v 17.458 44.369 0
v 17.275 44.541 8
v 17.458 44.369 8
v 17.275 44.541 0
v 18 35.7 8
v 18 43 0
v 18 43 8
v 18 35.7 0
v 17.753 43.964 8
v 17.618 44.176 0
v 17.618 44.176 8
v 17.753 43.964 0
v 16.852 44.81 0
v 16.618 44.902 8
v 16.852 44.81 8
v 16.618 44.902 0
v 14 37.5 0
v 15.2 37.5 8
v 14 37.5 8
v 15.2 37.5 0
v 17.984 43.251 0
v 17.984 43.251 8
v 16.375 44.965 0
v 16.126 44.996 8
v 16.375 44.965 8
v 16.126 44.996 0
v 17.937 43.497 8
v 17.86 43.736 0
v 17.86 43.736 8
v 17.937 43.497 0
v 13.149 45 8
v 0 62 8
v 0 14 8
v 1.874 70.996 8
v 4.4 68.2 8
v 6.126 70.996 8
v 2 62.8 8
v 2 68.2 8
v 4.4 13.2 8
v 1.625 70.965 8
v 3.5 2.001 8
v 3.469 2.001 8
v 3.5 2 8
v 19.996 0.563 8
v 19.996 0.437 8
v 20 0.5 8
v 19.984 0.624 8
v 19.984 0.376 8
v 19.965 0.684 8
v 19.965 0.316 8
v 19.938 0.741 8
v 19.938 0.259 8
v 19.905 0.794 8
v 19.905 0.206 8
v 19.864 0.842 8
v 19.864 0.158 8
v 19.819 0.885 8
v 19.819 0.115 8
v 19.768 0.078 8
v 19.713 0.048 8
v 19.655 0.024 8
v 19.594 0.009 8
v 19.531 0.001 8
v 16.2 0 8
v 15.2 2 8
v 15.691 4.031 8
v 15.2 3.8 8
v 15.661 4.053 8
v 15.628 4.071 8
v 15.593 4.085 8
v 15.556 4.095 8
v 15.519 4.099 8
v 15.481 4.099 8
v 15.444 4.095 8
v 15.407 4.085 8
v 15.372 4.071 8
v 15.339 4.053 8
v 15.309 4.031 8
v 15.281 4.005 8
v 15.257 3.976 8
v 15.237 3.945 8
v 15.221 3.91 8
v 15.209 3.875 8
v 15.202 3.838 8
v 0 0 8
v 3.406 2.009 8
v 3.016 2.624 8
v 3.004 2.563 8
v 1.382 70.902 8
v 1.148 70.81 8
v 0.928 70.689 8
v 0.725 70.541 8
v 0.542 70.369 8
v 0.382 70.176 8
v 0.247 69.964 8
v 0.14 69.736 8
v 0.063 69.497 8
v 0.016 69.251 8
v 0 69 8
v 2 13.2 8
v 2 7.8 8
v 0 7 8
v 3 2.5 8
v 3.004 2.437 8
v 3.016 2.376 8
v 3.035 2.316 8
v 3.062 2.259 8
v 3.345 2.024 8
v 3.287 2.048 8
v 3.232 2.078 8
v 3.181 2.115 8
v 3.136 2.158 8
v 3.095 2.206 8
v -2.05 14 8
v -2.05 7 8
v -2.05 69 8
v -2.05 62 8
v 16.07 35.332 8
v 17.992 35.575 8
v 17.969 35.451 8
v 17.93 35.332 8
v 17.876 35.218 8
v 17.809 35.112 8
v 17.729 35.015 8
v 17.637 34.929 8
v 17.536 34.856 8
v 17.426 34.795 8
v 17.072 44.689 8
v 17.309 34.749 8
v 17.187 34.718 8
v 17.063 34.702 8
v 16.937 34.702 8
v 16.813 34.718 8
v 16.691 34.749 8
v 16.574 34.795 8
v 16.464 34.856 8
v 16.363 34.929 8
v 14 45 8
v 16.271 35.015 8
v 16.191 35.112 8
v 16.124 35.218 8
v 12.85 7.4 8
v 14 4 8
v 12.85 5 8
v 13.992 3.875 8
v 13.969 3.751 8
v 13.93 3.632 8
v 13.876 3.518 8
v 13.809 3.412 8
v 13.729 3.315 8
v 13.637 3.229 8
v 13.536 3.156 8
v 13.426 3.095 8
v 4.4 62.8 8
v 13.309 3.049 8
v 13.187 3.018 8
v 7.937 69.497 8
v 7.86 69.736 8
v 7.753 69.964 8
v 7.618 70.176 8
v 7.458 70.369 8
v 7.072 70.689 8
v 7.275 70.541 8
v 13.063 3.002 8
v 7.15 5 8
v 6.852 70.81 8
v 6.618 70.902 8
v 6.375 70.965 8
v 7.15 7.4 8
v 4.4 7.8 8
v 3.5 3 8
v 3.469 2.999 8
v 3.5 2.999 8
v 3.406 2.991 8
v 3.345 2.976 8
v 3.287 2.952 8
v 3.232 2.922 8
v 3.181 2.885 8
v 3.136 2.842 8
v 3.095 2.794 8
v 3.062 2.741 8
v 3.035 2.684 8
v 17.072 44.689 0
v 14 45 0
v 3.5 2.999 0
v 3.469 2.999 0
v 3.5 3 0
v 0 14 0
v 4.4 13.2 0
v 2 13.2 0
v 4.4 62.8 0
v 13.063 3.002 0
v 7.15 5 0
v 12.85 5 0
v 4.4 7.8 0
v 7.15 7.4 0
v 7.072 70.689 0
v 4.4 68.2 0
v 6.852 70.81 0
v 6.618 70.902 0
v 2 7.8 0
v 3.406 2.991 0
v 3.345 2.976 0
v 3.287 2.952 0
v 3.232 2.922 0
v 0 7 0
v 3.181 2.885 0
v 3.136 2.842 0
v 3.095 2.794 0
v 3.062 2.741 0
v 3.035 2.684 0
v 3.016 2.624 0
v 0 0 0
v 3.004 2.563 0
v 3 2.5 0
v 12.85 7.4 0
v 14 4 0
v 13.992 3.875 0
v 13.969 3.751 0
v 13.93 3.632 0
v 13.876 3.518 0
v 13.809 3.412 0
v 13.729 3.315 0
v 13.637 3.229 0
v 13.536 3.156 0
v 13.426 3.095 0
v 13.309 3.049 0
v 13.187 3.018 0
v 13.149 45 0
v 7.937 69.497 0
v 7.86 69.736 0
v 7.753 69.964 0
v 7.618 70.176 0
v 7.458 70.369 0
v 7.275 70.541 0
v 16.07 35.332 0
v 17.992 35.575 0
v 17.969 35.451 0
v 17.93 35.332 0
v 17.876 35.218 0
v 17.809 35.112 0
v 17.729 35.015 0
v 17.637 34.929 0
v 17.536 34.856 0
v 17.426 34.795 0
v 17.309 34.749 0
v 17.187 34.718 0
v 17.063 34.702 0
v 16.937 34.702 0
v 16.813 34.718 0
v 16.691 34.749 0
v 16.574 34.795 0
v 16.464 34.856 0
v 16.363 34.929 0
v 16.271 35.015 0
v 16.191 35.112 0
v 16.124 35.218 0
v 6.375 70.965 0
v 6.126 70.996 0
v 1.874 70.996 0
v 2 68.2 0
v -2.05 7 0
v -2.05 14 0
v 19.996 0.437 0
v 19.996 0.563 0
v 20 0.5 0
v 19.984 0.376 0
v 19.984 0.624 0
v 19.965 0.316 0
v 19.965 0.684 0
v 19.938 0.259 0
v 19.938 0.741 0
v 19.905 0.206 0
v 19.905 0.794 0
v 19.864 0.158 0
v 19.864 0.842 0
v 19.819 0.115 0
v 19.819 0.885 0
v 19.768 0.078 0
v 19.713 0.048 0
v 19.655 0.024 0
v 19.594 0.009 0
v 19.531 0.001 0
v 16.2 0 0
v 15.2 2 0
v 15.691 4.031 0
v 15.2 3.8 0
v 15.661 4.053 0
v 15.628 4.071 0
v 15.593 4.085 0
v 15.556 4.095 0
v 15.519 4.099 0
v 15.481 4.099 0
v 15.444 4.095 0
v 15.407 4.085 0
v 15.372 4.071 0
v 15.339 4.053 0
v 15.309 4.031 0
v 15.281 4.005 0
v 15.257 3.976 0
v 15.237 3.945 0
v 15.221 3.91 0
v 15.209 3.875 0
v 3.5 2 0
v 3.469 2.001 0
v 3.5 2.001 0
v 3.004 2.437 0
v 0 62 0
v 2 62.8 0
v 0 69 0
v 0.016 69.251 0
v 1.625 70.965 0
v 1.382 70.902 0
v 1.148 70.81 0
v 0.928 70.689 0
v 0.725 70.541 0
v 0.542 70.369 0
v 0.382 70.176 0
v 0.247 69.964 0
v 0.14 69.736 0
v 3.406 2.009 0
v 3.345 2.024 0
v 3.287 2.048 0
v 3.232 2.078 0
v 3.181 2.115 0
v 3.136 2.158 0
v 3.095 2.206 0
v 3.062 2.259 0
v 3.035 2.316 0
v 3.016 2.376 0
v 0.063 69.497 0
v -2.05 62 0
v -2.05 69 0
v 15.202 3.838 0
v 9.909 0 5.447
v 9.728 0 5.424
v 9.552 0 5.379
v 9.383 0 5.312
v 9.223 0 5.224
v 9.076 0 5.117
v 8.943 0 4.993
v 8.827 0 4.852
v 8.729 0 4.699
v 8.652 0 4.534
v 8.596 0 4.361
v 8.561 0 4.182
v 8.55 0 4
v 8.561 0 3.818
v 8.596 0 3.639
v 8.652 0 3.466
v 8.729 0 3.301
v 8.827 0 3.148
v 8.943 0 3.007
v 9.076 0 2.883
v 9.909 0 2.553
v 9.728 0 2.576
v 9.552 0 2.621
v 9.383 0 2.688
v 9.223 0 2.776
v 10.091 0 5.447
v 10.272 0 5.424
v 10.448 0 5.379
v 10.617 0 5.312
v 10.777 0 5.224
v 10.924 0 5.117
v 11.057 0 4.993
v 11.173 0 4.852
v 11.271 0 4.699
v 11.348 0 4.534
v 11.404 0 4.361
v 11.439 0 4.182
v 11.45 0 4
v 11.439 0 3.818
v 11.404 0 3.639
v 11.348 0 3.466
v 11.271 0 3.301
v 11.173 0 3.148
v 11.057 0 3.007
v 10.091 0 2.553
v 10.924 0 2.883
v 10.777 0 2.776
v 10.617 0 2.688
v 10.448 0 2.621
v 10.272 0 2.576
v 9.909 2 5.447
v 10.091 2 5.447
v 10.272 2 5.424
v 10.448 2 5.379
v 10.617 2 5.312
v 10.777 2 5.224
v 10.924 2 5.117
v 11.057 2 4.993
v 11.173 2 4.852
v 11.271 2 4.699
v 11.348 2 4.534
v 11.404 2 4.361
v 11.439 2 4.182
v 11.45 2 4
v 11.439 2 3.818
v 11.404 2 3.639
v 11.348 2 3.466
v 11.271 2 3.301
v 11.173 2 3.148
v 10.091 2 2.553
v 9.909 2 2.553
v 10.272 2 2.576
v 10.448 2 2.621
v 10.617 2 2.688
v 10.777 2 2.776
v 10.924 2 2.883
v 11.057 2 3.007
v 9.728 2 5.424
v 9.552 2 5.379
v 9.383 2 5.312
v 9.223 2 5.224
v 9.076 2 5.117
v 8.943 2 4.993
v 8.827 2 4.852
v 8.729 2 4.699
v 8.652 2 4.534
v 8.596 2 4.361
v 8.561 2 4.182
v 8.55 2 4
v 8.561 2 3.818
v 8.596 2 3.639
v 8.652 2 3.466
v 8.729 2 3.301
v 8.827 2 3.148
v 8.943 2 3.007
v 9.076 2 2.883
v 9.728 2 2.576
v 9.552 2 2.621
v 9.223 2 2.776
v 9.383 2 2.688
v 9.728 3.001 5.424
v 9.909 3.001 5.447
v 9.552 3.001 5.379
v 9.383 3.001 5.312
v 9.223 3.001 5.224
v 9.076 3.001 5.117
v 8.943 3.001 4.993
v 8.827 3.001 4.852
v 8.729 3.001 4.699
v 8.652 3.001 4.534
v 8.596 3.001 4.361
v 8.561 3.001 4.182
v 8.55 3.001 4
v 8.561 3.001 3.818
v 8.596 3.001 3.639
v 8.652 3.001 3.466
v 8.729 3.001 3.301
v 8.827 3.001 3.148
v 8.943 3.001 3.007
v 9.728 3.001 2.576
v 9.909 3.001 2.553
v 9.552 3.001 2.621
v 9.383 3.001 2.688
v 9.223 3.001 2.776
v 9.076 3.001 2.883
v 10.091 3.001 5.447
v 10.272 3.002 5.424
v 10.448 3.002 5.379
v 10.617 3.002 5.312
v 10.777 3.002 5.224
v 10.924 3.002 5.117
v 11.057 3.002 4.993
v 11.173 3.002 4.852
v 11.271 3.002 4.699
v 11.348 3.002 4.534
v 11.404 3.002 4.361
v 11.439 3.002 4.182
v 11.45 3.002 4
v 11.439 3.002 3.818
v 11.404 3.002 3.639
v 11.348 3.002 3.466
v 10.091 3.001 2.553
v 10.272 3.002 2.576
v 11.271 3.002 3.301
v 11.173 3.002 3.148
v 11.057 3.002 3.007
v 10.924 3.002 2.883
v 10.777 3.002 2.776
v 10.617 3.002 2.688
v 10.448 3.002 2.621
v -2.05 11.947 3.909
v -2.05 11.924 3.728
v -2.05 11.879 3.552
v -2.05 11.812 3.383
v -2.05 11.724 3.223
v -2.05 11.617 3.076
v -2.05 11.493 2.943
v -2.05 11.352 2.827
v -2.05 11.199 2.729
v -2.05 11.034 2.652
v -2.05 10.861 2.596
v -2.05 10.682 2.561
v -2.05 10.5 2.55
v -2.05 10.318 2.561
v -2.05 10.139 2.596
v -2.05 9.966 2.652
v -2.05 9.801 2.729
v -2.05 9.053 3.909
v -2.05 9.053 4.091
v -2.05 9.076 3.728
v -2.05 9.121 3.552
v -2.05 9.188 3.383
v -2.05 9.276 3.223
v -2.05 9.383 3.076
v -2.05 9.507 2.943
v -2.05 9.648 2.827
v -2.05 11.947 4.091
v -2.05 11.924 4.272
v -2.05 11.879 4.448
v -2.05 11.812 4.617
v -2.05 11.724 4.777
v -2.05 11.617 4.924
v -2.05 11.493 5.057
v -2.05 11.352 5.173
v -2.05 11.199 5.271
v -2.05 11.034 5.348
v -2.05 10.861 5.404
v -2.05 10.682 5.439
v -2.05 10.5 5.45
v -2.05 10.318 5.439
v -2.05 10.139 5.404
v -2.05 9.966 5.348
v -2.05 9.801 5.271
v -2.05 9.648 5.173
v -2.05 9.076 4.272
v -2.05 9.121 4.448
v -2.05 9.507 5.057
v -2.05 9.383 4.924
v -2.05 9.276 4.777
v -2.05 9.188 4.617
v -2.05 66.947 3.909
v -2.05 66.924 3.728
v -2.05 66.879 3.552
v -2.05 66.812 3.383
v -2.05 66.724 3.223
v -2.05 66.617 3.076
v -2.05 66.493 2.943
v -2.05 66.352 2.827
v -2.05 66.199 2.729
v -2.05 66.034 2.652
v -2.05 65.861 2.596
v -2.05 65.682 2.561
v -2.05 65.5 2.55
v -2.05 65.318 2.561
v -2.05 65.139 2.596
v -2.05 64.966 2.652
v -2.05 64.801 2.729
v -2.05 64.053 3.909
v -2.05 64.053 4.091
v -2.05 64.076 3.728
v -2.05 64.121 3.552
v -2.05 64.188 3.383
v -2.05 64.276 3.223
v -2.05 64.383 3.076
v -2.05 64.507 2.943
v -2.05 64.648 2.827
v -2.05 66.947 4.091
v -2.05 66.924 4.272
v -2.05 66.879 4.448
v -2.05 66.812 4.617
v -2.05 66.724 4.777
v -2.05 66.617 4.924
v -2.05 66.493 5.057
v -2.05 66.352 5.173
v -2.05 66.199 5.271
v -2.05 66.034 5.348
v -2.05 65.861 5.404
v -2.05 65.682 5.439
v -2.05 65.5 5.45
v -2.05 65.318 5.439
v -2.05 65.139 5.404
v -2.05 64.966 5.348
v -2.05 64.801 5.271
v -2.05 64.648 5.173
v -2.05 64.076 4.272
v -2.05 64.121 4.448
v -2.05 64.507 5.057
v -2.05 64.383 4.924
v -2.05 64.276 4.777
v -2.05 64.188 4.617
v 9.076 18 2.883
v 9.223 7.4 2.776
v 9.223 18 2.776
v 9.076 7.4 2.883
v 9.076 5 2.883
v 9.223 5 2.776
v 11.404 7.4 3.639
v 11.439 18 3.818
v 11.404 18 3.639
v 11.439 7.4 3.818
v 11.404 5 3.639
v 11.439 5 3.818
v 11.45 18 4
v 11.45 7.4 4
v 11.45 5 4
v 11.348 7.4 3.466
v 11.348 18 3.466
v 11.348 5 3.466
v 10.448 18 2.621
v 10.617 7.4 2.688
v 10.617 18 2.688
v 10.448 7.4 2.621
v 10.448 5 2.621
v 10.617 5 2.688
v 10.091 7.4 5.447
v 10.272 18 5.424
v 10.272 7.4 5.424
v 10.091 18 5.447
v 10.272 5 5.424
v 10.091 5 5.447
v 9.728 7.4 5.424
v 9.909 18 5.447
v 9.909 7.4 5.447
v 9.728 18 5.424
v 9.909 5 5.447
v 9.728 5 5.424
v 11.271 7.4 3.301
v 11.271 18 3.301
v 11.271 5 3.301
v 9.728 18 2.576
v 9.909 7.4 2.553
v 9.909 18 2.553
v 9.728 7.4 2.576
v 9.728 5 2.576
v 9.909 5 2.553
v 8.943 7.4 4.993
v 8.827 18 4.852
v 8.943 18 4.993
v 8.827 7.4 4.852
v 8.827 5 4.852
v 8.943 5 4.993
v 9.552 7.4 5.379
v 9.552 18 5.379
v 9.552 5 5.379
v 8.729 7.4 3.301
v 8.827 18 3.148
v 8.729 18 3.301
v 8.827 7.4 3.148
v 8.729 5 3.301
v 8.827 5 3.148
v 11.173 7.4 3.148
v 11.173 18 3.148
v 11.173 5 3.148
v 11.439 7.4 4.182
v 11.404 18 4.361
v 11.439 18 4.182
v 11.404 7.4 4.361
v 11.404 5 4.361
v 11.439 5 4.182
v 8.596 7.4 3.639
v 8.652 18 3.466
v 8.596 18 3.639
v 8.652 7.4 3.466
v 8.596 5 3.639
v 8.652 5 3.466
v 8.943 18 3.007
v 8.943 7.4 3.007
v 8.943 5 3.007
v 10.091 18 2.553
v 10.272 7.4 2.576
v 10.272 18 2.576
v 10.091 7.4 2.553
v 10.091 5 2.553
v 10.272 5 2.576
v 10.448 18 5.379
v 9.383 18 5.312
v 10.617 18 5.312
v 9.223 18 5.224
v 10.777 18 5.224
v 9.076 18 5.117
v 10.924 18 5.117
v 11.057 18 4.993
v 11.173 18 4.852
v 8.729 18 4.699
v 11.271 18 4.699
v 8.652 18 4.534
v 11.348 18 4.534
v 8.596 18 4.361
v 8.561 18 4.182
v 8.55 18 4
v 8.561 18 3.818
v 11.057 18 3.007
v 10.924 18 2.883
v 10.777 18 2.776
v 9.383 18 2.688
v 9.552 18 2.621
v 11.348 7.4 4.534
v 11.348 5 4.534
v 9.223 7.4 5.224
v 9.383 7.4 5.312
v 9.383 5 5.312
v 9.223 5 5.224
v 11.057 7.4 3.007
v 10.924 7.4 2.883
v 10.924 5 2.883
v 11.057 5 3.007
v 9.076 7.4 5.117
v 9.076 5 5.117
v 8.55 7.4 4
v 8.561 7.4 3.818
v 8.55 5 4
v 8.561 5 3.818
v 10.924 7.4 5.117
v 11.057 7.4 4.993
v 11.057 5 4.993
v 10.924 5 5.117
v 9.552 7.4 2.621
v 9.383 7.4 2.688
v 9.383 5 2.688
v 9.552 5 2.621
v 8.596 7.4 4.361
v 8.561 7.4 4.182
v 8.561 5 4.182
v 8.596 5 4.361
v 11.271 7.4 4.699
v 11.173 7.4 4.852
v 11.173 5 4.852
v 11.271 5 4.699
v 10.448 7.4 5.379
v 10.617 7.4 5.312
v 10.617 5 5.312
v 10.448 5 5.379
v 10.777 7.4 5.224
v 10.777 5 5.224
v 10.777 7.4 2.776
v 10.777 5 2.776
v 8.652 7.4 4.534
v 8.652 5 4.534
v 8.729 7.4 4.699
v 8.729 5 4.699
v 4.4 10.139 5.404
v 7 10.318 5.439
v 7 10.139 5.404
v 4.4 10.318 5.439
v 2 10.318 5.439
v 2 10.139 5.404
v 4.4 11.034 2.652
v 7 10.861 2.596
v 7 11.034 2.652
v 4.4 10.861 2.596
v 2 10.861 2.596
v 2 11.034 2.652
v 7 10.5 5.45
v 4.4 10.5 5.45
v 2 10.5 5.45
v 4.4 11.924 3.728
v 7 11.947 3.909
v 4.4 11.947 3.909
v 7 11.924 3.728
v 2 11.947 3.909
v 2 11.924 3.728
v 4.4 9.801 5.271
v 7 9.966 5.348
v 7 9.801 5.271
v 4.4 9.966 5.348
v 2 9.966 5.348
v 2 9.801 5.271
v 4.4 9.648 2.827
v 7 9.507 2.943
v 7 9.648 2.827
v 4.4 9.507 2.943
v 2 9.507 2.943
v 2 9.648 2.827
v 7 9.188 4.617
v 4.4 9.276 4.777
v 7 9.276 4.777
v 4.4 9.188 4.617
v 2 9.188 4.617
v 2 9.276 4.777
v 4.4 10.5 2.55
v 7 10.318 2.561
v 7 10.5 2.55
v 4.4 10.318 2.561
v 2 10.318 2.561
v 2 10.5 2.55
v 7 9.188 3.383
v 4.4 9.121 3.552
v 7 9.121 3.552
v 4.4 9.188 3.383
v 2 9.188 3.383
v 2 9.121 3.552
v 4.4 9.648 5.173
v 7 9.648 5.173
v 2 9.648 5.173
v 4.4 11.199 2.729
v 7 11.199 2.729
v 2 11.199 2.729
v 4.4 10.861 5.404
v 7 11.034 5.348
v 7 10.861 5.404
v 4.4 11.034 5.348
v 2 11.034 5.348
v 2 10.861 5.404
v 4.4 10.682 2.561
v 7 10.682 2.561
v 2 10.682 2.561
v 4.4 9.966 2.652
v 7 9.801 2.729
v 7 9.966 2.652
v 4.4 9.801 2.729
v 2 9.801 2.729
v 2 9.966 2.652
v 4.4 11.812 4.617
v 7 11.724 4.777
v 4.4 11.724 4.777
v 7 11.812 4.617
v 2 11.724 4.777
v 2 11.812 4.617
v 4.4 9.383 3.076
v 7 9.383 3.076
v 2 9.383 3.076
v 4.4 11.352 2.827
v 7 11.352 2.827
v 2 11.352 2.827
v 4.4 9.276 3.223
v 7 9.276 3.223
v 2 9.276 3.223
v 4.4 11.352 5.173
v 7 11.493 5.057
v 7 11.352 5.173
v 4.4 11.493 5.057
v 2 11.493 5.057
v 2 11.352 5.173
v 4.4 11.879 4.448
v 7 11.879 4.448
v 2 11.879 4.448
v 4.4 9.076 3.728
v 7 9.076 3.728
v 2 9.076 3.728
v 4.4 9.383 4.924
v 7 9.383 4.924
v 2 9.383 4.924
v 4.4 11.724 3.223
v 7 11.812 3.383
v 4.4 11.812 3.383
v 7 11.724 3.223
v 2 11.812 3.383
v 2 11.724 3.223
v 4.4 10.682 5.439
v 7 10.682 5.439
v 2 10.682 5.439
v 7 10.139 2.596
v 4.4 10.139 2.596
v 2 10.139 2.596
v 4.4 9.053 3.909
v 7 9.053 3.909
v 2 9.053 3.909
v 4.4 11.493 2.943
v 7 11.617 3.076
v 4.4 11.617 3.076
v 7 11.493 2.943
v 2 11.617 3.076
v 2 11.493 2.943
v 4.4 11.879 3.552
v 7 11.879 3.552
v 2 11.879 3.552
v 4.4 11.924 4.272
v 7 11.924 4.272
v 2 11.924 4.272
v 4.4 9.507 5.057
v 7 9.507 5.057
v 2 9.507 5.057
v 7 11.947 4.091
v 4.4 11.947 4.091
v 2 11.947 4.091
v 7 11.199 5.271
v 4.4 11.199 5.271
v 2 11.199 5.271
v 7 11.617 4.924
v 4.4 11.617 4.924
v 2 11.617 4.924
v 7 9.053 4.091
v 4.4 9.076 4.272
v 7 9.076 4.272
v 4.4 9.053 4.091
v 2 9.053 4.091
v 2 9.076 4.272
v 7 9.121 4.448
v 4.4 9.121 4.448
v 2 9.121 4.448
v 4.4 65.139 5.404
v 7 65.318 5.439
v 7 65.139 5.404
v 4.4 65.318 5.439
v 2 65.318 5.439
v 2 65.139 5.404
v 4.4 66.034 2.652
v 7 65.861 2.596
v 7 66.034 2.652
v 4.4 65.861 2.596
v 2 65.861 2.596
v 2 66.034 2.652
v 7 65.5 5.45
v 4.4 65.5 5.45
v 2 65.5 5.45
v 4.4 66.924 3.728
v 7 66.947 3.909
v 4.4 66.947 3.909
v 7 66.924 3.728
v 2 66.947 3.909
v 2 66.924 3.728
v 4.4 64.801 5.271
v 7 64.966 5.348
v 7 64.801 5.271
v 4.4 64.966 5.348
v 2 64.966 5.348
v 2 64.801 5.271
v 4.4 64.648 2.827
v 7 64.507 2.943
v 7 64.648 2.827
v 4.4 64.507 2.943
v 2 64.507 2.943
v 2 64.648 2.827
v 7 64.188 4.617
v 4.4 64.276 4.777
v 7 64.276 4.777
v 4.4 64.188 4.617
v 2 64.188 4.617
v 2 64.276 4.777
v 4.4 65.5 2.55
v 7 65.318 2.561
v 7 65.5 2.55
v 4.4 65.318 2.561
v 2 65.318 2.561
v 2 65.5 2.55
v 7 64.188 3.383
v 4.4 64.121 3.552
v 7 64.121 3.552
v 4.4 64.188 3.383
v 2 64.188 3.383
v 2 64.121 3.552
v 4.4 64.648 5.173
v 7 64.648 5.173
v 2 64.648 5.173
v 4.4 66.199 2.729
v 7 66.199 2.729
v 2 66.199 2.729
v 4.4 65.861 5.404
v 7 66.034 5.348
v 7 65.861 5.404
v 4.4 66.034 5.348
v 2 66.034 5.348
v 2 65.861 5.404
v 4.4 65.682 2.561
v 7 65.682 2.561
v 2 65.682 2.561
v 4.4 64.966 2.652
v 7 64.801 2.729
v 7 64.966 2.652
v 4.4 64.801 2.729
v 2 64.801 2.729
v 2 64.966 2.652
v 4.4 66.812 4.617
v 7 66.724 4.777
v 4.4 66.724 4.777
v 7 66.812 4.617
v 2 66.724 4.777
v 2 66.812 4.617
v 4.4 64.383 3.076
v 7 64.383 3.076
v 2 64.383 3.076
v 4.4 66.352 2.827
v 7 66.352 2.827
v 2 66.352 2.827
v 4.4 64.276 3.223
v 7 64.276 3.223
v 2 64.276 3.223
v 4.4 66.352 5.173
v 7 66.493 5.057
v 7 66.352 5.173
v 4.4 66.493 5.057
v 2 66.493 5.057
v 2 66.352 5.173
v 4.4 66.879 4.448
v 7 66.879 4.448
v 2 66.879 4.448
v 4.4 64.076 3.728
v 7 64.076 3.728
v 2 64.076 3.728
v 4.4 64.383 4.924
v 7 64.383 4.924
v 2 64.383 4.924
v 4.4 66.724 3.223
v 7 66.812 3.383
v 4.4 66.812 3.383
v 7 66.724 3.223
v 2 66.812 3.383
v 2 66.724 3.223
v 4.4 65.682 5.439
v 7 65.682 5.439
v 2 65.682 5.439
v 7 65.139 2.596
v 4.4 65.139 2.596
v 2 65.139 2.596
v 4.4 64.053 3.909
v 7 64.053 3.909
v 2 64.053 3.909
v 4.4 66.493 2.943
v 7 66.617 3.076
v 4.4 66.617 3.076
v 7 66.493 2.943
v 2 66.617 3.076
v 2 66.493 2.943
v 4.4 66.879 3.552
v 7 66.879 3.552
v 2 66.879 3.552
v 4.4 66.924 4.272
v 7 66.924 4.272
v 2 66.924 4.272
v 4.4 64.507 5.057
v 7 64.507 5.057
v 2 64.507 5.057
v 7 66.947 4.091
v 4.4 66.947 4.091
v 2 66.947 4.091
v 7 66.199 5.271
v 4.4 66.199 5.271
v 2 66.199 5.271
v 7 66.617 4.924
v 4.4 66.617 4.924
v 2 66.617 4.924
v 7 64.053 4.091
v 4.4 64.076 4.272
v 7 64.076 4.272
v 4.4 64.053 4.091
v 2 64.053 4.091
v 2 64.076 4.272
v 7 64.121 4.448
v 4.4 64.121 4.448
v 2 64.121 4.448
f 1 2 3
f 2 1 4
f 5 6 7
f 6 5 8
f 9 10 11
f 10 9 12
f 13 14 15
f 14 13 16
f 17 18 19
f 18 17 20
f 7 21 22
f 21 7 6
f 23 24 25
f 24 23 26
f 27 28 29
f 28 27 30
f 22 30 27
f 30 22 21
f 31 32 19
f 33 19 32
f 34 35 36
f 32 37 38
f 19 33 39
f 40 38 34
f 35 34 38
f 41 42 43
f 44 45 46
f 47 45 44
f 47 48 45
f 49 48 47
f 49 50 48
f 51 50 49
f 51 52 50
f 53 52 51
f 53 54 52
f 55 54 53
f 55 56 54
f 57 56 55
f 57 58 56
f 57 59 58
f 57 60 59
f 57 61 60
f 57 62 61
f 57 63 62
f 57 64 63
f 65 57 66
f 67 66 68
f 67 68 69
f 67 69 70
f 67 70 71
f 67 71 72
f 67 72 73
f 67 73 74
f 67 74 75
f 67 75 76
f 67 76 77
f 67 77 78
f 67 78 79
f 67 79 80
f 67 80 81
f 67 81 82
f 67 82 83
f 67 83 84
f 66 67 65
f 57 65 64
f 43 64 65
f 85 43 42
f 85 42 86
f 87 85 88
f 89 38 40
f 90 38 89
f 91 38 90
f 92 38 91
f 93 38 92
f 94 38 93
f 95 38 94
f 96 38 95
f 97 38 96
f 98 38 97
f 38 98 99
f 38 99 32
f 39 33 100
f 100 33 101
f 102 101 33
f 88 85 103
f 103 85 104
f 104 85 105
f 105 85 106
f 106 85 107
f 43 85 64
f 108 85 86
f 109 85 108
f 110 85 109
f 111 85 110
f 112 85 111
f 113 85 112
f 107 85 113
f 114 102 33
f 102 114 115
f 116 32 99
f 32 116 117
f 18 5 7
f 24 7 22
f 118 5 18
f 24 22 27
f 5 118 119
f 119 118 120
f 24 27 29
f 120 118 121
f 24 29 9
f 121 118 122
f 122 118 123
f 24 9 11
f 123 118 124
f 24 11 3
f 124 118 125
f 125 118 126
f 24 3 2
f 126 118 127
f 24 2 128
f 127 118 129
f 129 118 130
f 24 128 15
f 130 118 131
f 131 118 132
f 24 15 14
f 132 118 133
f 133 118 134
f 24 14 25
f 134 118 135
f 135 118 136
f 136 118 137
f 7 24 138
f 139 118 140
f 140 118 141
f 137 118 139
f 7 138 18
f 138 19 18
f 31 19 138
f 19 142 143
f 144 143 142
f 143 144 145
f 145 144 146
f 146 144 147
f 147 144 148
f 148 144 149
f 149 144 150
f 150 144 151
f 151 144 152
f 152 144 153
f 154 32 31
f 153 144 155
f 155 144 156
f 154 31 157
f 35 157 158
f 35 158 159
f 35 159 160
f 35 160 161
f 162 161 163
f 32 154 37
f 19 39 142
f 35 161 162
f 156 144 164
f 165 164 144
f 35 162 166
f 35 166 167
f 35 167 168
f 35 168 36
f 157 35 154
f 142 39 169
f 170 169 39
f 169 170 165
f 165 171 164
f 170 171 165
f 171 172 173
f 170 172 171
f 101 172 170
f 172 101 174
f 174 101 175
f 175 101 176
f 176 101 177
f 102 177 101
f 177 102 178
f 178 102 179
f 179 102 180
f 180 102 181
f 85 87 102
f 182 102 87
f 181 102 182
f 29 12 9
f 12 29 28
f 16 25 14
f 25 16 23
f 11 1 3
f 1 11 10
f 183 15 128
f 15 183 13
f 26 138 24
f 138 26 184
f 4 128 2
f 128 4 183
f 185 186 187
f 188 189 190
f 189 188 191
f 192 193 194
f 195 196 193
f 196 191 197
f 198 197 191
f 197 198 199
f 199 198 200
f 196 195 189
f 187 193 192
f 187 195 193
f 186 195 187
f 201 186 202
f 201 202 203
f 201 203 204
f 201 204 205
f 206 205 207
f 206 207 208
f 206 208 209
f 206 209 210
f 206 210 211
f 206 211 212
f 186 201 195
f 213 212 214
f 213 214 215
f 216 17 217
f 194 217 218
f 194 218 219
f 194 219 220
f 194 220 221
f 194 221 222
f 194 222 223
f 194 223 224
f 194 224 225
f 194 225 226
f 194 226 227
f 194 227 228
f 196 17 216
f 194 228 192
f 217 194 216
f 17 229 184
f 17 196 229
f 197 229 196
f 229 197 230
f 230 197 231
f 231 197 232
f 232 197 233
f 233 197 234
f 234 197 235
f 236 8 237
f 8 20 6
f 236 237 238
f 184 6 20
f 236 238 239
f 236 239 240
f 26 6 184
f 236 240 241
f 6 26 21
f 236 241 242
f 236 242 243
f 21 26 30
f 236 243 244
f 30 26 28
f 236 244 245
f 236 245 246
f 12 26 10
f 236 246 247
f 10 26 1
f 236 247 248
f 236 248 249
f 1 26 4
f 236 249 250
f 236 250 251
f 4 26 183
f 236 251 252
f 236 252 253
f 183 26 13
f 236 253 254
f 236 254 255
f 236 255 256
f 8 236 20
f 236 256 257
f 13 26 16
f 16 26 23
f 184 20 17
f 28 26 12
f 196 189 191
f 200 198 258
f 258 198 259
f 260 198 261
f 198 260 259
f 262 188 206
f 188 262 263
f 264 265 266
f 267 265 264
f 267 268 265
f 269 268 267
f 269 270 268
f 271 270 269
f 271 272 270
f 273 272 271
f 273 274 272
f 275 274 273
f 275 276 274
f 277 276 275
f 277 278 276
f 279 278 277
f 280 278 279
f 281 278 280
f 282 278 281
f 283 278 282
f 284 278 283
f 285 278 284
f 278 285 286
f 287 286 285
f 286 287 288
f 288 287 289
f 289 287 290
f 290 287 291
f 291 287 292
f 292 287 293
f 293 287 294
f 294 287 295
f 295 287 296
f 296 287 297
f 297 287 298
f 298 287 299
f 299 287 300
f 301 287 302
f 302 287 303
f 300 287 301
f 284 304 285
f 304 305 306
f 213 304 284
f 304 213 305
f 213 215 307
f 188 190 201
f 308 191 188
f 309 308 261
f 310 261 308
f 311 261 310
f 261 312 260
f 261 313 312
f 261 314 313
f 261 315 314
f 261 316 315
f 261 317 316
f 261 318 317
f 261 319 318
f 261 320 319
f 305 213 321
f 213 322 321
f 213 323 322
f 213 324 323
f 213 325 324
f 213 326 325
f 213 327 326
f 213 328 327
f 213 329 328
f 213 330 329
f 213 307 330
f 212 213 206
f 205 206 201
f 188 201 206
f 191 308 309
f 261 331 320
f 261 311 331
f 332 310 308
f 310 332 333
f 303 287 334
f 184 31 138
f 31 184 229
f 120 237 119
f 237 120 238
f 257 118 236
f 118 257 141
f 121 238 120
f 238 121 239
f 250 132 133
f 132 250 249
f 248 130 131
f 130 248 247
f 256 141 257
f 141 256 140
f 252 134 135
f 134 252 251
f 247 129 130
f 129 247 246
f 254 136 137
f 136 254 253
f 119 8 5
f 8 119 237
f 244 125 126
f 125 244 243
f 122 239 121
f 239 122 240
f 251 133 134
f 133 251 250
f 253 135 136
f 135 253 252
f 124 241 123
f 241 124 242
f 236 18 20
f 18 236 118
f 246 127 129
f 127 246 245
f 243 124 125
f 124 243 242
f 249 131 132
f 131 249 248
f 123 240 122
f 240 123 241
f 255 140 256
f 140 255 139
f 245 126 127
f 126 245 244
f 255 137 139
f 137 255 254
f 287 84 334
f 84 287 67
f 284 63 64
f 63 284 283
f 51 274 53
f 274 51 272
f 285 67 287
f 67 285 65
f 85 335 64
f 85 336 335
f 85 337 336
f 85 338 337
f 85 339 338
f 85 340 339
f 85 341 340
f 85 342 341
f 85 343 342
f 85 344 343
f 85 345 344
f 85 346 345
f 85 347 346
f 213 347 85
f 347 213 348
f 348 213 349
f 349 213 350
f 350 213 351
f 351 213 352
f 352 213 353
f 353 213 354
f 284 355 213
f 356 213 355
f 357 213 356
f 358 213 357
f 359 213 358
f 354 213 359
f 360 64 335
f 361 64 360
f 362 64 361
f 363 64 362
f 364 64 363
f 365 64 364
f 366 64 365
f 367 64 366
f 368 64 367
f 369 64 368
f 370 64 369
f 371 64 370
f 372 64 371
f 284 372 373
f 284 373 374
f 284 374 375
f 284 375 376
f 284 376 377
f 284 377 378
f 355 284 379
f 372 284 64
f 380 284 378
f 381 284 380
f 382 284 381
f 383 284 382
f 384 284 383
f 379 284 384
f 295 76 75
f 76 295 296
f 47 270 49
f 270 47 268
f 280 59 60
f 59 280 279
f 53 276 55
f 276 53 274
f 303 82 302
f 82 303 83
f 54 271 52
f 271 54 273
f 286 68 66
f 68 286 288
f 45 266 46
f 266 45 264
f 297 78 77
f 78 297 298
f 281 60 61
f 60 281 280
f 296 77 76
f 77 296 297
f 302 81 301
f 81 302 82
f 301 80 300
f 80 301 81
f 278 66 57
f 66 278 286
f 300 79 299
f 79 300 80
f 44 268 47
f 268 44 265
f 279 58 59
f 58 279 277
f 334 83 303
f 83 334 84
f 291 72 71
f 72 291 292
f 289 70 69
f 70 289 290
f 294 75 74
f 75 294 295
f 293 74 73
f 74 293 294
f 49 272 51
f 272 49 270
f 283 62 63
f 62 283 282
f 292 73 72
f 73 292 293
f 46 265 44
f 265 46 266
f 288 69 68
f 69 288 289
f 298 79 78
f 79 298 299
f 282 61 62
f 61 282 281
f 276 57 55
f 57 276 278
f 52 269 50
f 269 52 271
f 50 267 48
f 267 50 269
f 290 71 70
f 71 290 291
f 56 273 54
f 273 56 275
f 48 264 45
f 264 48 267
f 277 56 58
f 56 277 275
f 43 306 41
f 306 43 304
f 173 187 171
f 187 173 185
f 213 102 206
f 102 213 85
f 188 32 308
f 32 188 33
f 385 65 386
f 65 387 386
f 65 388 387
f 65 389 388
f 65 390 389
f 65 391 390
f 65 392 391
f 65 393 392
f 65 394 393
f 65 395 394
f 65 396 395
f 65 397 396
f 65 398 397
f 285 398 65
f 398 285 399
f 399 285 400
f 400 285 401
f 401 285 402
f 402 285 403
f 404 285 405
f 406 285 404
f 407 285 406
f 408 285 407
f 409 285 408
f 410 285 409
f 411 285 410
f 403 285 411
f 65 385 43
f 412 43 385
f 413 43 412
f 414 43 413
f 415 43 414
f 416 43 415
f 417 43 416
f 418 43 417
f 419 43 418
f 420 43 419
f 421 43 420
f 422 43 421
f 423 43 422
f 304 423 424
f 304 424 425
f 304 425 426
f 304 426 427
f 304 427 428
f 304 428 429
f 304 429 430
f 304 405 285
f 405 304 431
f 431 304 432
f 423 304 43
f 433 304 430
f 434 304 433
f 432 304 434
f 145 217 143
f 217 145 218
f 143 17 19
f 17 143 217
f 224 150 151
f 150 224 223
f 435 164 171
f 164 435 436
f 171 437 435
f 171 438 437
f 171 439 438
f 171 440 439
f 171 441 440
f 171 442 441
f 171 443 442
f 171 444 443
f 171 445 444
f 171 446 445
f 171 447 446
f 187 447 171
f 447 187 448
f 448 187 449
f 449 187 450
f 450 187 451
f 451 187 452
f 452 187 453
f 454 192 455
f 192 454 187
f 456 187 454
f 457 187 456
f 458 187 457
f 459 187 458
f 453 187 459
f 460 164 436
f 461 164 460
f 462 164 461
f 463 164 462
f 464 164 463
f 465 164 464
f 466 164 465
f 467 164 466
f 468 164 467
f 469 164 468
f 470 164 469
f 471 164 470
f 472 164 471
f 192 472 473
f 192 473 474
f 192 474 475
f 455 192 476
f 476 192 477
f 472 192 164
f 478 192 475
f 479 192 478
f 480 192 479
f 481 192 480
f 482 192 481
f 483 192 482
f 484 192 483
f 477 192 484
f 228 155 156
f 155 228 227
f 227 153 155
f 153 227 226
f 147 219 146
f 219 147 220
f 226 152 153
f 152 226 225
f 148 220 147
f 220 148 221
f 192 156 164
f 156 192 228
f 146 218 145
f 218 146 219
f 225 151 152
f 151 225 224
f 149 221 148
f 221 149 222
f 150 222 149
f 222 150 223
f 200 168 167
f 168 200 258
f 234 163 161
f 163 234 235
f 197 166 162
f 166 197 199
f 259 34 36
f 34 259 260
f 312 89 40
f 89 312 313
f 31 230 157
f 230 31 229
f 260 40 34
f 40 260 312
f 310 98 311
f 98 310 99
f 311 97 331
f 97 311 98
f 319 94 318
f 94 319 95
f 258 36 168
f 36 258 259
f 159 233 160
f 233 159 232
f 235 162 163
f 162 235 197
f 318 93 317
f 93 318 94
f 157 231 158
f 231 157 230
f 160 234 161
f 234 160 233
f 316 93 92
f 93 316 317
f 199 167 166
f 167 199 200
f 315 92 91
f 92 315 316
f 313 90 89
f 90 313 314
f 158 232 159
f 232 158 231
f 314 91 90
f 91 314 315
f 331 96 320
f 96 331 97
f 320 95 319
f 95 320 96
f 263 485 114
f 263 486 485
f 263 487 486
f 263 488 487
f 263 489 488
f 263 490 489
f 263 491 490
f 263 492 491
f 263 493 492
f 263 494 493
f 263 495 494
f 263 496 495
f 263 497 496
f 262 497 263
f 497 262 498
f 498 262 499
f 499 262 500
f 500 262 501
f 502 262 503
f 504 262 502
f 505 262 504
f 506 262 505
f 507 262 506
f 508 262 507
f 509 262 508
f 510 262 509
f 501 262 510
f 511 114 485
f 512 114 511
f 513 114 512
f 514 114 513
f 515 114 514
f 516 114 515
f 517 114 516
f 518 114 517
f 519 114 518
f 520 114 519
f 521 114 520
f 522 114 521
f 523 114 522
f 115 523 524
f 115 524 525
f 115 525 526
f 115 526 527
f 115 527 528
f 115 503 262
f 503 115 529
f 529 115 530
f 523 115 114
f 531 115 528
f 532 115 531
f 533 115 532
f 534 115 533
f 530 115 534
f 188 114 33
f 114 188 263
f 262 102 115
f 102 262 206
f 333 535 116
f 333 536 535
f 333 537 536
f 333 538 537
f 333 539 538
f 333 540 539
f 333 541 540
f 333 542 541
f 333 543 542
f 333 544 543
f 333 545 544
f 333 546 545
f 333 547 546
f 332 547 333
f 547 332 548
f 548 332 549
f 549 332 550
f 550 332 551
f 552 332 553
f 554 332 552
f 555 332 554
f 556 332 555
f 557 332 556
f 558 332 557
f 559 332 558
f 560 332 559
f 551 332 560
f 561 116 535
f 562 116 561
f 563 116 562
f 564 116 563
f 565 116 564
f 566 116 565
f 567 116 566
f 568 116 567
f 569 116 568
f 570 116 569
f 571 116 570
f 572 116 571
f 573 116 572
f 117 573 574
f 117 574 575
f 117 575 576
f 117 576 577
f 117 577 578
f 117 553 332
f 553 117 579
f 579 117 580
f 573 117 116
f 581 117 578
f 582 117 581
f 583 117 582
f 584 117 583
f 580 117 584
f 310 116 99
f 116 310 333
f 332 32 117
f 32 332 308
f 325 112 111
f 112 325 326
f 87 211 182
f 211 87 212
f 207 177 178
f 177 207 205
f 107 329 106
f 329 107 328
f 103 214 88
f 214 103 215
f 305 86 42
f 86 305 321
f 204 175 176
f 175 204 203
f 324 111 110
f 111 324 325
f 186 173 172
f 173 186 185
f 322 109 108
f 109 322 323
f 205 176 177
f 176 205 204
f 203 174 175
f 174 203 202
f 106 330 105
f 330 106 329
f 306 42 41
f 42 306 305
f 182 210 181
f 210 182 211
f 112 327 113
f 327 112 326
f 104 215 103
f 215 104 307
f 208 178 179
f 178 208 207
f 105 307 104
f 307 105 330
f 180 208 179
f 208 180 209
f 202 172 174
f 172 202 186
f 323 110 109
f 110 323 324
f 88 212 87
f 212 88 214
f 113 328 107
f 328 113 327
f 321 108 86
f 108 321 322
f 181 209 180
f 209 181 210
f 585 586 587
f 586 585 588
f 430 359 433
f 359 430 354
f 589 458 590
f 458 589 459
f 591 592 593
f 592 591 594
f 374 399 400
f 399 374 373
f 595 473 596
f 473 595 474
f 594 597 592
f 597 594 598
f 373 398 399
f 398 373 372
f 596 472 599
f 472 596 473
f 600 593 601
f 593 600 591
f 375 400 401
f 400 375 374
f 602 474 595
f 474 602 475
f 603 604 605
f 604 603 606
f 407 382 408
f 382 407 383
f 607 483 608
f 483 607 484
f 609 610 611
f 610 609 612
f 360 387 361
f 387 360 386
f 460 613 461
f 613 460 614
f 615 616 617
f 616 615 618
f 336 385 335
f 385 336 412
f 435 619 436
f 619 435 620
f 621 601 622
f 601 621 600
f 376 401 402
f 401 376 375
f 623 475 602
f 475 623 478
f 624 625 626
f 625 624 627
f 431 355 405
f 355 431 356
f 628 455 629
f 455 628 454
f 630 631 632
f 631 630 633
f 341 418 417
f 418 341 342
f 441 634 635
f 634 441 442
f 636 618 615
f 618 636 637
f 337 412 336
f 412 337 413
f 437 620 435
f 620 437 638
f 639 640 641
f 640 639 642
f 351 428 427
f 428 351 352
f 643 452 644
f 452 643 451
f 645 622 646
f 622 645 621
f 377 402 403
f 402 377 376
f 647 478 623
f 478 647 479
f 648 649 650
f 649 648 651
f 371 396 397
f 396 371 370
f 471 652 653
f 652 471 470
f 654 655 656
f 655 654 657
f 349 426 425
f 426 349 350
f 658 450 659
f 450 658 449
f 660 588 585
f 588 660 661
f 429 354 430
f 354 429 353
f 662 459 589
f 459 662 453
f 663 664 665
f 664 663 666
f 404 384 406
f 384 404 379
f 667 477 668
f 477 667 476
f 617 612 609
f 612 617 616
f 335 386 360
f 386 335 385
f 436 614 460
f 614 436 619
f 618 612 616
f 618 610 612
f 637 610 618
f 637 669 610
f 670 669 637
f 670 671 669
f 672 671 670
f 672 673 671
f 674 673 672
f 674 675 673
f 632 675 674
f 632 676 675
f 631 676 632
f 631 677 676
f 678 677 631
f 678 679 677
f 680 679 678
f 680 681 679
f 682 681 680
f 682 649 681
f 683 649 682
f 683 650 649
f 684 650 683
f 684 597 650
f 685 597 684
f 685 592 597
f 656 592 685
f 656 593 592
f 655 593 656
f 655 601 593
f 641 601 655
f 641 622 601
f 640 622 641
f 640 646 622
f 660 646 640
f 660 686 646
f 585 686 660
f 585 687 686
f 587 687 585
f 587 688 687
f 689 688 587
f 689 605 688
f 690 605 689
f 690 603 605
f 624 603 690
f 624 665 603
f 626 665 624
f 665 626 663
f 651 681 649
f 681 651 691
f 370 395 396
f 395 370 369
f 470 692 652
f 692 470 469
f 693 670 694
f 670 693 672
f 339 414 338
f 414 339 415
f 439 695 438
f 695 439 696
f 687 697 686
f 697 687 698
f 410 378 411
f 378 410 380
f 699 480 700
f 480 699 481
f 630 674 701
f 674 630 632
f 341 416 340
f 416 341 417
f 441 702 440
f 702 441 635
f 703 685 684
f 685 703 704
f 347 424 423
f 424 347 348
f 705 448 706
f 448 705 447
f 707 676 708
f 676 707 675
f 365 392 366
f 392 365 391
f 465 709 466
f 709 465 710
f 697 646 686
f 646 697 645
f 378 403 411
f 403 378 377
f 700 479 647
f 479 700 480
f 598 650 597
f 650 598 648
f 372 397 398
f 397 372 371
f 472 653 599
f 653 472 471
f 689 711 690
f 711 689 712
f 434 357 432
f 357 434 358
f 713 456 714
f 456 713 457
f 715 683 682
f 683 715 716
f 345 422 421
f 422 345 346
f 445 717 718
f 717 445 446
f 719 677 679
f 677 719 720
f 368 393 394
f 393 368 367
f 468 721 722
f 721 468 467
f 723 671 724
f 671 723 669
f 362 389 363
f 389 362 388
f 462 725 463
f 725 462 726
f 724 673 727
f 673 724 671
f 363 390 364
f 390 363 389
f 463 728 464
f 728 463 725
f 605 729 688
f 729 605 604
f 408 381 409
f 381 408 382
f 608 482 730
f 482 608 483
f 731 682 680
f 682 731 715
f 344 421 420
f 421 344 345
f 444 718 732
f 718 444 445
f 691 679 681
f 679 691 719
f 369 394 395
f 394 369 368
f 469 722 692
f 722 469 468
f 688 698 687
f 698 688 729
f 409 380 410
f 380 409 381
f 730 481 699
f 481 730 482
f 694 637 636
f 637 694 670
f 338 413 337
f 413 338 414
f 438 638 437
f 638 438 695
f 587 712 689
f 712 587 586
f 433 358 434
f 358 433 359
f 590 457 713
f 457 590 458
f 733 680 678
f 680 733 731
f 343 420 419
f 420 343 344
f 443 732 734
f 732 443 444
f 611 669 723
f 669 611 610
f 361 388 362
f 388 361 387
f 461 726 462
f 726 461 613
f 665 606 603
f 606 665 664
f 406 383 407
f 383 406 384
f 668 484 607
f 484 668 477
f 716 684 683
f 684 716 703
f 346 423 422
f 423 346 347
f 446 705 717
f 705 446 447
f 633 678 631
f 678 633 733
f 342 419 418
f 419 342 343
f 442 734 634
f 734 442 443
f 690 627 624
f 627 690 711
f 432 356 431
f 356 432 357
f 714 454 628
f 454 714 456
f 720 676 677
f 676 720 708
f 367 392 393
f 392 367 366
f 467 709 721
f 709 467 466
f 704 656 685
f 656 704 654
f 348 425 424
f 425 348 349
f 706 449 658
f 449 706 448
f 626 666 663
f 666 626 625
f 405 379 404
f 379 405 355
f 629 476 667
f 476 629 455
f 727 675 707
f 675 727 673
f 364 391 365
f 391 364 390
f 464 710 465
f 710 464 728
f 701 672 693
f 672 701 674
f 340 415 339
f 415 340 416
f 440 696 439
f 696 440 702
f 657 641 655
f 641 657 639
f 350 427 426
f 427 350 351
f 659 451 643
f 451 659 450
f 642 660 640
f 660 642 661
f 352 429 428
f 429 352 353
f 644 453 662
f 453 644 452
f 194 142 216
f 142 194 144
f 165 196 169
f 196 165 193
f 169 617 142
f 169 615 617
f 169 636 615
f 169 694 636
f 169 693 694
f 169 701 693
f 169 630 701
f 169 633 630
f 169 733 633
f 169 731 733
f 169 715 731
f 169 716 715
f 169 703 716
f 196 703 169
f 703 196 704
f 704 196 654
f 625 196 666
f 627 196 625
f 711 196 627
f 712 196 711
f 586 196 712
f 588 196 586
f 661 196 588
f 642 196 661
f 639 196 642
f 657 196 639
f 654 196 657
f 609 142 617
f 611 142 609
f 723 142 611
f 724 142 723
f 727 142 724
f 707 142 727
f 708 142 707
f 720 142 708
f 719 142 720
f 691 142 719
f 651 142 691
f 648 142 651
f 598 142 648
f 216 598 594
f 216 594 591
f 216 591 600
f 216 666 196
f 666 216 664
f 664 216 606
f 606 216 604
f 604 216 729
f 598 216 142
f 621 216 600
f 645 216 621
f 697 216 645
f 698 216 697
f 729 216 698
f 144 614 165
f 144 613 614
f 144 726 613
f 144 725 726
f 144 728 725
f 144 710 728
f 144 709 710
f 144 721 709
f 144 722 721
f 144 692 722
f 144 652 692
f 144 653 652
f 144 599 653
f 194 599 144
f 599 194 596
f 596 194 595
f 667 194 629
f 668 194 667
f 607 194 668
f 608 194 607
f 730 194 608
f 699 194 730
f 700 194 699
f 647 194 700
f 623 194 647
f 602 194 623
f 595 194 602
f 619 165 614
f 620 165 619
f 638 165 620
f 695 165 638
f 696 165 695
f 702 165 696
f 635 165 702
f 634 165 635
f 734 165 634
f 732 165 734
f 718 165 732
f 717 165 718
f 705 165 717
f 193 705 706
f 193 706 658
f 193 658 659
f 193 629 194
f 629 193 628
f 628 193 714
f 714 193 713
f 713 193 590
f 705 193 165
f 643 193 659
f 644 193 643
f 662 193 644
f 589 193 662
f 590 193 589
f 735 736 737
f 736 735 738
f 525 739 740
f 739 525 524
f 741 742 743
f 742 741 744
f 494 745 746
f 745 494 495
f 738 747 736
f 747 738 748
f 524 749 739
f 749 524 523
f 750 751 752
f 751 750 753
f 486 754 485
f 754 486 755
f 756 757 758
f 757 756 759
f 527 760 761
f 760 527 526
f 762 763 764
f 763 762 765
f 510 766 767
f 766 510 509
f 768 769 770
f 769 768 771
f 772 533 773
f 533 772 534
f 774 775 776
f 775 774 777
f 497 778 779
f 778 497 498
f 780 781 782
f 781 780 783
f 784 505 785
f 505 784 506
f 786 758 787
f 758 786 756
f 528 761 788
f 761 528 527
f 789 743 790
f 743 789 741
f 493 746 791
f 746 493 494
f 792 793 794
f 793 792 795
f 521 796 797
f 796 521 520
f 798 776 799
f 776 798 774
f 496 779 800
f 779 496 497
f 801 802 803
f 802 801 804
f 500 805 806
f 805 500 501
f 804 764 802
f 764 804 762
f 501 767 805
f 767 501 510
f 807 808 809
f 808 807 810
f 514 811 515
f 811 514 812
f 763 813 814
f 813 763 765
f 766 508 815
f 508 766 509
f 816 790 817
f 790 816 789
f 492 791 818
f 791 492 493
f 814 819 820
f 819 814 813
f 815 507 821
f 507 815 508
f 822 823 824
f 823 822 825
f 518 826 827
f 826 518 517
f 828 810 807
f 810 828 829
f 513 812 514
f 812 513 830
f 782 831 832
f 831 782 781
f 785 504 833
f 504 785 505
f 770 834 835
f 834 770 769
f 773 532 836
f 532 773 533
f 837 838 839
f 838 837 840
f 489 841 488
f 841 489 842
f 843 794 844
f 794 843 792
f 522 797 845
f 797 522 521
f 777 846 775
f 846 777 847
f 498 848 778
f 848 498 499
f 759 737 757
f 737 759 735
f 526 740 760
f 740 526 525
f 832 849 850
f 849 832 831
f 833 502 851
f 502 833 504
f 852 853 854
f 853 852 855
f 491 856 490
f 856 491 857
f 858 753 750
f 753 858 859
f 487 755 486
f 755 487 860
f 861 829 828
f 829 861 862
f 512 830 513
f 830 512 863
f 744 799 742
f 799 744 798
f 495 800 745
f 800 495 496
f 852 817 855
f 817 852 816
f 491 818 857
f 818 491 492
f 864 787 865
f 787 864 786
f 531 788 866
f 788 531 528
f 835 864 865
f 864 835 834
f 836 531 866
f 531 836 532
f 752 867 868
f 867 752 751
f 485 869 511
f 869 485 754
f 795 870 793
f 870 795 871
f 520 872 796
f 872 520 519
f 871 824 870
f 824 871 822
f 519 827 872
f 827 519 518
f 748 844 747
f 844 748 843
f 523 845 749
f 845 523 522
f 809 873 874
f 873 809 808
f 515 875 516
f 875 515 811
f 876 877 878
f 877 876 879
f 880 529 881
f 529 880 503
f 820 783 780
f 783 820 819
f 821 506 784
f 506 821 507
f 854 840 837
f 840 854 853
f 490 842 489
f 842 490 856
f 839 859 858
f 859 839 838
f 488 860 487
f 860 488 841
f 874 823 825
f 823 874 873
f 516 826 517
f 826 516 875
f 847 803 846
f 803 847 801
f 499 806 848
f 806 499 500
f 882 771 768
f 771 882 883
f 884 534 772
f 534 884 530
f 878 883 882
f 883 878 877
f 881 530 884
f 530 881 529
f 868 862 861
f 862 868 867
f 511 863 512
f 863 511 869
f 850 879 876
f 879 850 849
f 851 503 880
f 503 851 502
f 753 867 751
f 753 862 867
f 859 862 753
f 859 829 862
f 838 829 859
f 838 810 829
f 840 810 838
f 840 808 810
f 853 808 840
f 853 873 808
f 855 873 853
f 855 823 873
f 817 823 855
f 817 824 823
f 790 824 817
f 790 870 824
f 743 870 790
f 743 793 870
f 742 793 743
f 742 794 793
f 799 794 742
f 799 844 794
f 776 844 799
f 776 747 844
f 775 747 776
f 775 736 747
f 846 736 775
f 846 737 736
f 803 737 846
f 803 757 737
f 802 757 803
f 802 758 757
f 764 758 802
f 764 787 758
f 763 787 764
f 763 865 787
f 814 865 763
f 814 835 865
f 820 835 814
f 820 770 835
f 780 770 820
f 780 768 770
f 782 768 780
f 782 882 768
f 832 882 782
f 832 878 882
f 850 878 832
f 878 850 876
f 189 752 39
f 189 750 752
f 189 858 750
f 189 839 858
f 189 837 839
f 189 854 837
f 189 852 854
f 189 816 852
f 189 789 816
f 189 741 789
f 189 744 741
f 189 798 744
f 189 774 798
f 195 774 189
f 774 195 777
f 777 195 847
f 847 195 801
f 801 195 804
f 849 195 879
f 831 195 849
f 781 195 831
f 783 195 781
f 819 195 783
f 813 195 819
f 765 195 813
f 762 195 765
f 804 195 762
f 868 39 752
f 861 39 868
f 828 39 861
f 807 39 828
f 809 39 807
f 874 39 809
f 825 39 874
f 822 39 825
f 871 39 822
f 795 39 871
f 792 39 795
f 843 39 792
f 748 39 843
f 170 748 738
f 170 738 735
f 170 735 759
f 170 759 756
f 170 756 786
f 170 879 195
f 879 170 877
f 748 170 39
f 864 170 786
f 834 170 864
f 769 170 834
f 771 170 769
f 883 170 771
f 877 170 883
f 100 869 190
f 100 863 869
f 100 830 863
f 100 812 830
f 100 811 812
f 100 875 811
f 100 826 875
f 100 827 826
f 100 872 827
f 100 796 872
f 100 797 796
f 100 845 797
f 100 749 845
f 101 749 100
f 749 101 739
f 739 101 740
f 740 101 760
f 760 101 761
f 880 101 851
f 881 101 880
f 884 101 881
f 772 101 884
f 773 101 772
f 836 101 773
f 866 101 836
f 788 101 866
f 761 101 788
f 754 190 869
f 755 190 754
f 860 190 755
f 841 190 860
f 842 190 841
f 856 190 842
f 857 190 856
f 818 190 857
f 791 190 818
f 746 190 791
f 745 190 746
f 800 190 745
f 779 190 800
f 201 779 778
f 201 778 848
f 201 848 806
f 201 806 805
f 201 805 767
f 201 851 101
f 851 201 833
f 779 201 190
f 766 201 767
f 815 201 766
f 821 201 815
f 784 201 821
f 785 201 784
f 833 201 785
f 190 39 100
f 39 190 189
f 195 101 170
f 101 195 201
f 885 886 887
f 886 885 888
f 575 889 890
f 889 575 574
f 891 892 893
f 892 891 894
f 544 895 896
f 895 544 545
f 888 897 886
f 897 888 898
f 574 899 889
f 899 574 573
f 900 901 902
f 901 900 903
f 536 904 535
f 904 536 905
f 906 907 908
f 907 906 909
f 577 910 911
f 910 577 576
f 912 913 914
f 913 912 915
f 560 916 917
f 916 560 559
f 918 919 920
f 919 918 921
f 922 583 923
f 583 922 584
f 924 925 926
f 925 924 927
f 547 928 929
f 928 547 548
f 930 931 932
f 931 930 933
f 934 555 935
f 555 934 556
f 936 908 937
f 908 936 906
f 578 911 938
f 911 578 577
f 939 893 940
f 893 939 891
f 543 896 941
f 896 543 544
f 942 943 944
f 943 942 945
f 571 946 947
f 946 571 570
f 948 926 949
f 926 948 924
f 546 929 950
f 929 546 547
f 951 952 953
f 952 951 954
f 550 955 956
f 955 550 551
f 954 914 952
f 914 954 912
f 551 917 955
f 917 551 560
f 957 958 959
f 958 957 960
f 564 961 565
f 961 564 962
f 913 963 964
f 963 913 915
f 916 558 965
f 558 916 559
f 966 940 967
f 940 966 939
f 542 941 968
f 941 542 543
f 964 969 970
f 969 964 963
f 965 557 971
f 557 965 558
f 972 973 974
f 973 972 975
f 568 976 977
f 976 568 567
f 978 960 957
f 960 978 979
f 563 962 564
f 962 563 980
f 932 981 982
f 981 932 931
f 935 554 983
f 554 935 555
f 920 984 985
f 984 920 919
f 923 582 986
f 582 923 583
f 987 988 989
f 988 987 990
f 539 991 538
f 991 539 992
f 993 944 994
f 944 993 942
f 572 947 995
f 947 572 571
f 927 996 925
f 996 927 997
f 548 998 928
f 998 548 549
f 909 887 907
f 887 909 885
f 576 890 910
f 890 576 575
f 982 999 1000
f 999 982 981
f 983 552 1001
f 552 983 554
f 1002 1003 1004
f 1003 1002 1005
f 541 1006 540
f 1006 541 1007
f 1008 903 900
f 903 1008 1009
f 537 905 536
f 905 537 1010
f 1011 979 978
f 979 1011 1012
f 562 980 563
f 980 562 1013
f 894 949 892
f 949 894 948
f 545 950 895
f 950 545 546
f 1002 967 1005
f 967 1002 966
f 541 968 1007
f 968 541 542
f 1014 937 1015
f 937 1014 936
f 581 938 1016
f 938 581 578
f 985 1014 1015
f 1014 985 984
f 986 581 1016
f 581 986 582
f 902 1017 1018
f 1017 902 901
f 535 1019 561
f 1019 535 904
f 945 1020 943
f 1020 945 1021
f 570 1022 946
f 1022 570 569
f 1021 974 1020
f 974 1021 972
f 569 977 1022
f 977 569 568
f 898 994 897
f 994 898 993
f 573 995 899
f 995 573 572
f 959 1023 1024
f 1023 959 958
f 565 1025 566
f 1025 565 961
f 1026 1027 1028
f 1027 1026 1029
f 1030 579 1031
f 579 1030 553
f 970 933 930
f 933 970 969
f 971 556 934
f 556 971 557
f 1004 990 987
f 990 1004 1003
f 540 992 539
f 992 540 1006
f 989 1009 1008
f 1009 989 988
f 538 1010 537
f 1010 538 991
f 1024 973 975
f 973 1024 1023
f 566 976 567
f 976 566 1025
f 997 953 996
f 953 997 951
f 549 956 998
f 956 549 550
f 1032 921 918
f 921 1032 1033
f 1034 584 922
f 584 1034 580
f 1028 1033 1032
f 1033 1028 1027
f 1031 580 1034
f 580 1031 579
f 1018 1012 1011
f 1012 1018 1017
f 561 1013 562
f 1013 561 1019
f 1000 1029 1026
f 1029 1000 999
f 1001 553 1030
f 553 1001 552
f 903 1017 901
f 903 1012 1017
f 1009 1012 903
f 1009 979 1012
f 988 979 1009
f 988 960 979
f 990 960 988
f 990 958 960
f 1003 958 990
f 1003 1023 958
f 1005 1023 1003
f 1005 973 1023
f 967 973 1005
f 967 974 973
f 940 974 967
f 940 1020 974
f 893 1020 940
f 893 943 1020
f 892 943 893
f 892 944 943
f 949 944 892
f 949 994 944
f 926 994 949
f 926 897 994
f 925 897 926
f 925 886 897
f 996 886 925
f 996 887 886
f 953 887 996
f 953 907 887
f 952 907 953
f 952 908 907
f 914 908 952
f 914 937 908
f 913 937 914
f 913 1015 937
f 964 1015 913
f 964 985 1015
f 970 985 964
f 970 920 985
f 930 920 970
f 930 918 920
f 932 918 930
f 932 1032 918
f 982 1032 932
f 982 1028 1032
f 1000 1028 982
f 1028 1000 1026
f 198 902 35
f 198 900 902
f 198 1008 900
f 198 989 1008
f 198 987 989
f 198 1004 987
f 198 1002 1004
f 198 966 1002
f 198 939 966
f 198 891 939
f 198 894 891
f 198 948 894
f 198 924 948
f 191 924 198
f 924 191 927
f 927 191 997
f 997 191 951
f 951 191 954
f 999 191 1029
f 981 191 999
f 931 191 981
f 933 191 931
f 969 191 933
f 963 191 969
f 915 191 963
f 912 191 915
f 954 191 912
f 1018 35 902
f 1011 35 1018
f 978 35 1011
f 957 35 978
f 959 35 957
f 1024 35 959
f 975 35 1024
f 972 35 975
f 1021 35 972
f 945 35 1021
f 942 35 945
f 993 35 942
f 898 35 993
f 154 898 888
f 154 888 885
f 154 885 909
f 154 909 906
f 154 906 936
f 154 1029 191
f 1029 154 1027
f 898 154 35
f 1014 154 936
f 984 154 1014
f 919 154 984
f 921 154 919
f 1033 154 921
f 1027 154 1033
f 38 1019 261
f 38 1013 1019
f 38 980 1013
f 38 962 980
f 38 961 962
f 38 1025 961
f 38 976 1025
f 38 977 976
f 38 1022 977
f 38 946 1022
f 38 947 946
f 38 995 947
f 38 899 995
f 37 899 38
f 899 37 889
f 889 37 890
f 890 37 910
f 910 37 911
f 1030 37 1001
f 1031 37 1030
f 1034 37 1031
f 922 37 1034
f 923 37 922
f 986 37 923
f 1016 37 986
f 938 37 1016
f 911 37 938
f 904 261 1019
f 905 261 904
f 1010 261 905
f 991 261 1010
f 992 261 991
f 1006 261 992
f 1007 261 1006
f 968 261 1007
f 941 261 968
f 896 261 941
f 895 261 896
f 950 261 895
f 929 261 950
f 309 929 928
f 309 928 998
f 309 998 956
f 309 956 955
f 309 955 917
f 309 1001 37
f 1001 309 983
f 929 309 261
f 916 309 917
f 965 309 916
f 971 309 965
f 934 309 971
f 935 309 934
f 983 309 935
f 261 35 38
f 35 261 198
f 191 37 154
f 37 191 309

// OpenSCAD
//-------------------------------------------------------------------
// title: DIN clip
// author: OK1HRA 
// license: Creative Commons BY-SA
// URL: http://remoteqth.com/3d-din-rail-mount-clip.php
// Original revision: 0.1
// revision: 0.2b Contributed by John Cabrer
// format: OpenSCAD
//-------------------------------------------------------------------
// HowTo:
// Determine the center to center hole spacing of the device to mount (mount_hole_spacing)
// Pick a metric screw size, and length
// Pick a nut width and height
// See http://mcmaster-carr.com/ for drawings of all screws and nuts.
// The mount post length is calculated based on the screw length
// After after making your changes, press F5 to re-render them to the screen
// .STL export press F6 and menu /Design/Export as STL...

// ----- Inside Hole Calibration Values --------
// To use, print out a part with default values (i.e. mount_nut_width = 8,
// actual_measurement = 8)
// Measure the resulting hole width of the nut, and type that value as the actual measurement. Render and export. Print again.
// The gain_adjust value will insure that holes measure as they should.

expected_measurement = 8;
actual_measurement = 8;
gain_adjust = expected_measurement / actual_measurement; // Default = 8/8 = 1

//----------------- Mounting Srew Input Parameters ---------------------------------
plate_thickness = 9.55;    // This is the thickness of the thing being mounted
mount_hole_spacing = 55;    // mount_hole_spacing between mounting holes
mount_screw_length = 16; // Min = 6
mount_screw_thread_diameter = 2.9;    // Min = 1, Max = 6
mount_nut_width = 5.4;   // Max = 10
mount_nut_height = 2.4;   // Max = 5

//----------------- Mounting Srew Input Parameters, Default is M3x8 ---------------------------------
lock_screw_length = 16; 
lock_screw_thread_diameter = 2.9 * gain_adjust;
lock_nut_width = 5.4 * gain_adjust;
lock_nut_height = 2.4 * gain_adjust;

//----------------- Calculated Parameters
standoff_length = mount_screw_length - (mount_nut_height * gain_adjust) - plate_thickness - 2;
$fn=50;
width = 8; 
r_mount_screw = (mount_screw_thread_diameter * gain_adjust) / 2;      // Radius of the mounting screw threads
r_lock_screw = (lock_screw_thread_diameter * gain_adjust) / 2;
expand = 1;      // 0-x
long = 45;

din();

module din(){
	difference() {
		union() {
			hull() {
				translate([15+expand,long-2,0]) {
                    cylinder(h=width, r=2, center=false);}

                translate([12+expand,37.5,0]) {
                    cube([5,1,width], center=false);}

                translate([12+expand,long-1,0]) {
                    cube([1,1,width], center=false);}
            }

			hull() {
				translate([16+expand,35.7,0]) {
                    cylinder(h=width, r=1, center=false);}

                translate([14.2+expand,37.5,0]) {
                    cube([2.8,1,width], center=false);}
            }

			hull() {
				translate([18.5+expand,0.5,0]) {
                    cylinder(h=width, r=0.5, center=false);}
				translate([14.5+expand,3.8,0]) {
                    cylinder(h=width, r=0.3, center=false);}
				translate([14.2+expand,0,0]) {
                    cube([1,1,width], center=false);}
			}

			cube([3.5,4,width], center=false);
            cube([15+expand,2,width], center=false);

			hull() {
				translate([12+expand,4,0]) {
                    cylinder(h=width, r=1, center=false);}

                translate([0,3,0]) {
                    cube([1,1,width], center=false);}

                translate([0,long-1,0]) {
                    cube([13+expand,1,width], center=false);}
            }

			hull() {
            translate([0,40,0]) {
                cube([14,1,width], center=false);}

            translate([2,mount_hole_spacing+14,0]) {
                cylinder(h=width, r=2, center=false);}

            translate([6,mount_hole_spacing+14,0]) {
                cylinder(h=width, r=2, center=false);}
            }

            translate([-standoff_length,10.5-3.5,0]) {
                cube([standoff_length+1,7,width], center=false);}

            translate([-standoff_length,10.5-3.5+mount_hole_spacing,0]) {
                cube([standoff_length+1,7,width], center=false);}
        }
        // Clip fillet
        translate([3.5,2.5,-1]) {
            cylinder(h=width+2, r=0.5, center=false);}
        
        // Lock Screw and Nut
        translate([9+expand,-1,width/2]) rotate([-90,0,0]){
            cylinder(h=lock_screw_length+3, r=r_lock_screw, center=false);}

		translate([6.15+expand,5,-1]) {
            cube([5.7,lock_nut_height,width+2], center=false);}

        // 1. mount
        translate([-1-standoff_length,10.5,width/2]) rotate([0,90,0]){
            cylinder(h=standoff_length+8, r=r_mount_screw, center=false);}

		translate([2,7.65 - (((mount_nut_width * gain_adjust) - 5.7) / 2),-1]) {
            cube([mount_nut_height * gain_adjust,mount_nut_width * gain_adjust,width+2], center=false);}

        // 2. mount
        translate([-1-standoff_length,10.5+mount_hole_spacing,width/2]) rotate([0,90,0]){
            cylinder(h=standoff_length+8, r=r_mount_screw, center=false);}

		translate([2,7.65 - (((mount_nut_width * gain_adjust) - 5.7) / 2)+mount_hole_spacing,-1]) {
            cube([mount_nut_height * gain_adjust,mount_nut_width * gain_adjust,width+2], center=false);}
    }
}
